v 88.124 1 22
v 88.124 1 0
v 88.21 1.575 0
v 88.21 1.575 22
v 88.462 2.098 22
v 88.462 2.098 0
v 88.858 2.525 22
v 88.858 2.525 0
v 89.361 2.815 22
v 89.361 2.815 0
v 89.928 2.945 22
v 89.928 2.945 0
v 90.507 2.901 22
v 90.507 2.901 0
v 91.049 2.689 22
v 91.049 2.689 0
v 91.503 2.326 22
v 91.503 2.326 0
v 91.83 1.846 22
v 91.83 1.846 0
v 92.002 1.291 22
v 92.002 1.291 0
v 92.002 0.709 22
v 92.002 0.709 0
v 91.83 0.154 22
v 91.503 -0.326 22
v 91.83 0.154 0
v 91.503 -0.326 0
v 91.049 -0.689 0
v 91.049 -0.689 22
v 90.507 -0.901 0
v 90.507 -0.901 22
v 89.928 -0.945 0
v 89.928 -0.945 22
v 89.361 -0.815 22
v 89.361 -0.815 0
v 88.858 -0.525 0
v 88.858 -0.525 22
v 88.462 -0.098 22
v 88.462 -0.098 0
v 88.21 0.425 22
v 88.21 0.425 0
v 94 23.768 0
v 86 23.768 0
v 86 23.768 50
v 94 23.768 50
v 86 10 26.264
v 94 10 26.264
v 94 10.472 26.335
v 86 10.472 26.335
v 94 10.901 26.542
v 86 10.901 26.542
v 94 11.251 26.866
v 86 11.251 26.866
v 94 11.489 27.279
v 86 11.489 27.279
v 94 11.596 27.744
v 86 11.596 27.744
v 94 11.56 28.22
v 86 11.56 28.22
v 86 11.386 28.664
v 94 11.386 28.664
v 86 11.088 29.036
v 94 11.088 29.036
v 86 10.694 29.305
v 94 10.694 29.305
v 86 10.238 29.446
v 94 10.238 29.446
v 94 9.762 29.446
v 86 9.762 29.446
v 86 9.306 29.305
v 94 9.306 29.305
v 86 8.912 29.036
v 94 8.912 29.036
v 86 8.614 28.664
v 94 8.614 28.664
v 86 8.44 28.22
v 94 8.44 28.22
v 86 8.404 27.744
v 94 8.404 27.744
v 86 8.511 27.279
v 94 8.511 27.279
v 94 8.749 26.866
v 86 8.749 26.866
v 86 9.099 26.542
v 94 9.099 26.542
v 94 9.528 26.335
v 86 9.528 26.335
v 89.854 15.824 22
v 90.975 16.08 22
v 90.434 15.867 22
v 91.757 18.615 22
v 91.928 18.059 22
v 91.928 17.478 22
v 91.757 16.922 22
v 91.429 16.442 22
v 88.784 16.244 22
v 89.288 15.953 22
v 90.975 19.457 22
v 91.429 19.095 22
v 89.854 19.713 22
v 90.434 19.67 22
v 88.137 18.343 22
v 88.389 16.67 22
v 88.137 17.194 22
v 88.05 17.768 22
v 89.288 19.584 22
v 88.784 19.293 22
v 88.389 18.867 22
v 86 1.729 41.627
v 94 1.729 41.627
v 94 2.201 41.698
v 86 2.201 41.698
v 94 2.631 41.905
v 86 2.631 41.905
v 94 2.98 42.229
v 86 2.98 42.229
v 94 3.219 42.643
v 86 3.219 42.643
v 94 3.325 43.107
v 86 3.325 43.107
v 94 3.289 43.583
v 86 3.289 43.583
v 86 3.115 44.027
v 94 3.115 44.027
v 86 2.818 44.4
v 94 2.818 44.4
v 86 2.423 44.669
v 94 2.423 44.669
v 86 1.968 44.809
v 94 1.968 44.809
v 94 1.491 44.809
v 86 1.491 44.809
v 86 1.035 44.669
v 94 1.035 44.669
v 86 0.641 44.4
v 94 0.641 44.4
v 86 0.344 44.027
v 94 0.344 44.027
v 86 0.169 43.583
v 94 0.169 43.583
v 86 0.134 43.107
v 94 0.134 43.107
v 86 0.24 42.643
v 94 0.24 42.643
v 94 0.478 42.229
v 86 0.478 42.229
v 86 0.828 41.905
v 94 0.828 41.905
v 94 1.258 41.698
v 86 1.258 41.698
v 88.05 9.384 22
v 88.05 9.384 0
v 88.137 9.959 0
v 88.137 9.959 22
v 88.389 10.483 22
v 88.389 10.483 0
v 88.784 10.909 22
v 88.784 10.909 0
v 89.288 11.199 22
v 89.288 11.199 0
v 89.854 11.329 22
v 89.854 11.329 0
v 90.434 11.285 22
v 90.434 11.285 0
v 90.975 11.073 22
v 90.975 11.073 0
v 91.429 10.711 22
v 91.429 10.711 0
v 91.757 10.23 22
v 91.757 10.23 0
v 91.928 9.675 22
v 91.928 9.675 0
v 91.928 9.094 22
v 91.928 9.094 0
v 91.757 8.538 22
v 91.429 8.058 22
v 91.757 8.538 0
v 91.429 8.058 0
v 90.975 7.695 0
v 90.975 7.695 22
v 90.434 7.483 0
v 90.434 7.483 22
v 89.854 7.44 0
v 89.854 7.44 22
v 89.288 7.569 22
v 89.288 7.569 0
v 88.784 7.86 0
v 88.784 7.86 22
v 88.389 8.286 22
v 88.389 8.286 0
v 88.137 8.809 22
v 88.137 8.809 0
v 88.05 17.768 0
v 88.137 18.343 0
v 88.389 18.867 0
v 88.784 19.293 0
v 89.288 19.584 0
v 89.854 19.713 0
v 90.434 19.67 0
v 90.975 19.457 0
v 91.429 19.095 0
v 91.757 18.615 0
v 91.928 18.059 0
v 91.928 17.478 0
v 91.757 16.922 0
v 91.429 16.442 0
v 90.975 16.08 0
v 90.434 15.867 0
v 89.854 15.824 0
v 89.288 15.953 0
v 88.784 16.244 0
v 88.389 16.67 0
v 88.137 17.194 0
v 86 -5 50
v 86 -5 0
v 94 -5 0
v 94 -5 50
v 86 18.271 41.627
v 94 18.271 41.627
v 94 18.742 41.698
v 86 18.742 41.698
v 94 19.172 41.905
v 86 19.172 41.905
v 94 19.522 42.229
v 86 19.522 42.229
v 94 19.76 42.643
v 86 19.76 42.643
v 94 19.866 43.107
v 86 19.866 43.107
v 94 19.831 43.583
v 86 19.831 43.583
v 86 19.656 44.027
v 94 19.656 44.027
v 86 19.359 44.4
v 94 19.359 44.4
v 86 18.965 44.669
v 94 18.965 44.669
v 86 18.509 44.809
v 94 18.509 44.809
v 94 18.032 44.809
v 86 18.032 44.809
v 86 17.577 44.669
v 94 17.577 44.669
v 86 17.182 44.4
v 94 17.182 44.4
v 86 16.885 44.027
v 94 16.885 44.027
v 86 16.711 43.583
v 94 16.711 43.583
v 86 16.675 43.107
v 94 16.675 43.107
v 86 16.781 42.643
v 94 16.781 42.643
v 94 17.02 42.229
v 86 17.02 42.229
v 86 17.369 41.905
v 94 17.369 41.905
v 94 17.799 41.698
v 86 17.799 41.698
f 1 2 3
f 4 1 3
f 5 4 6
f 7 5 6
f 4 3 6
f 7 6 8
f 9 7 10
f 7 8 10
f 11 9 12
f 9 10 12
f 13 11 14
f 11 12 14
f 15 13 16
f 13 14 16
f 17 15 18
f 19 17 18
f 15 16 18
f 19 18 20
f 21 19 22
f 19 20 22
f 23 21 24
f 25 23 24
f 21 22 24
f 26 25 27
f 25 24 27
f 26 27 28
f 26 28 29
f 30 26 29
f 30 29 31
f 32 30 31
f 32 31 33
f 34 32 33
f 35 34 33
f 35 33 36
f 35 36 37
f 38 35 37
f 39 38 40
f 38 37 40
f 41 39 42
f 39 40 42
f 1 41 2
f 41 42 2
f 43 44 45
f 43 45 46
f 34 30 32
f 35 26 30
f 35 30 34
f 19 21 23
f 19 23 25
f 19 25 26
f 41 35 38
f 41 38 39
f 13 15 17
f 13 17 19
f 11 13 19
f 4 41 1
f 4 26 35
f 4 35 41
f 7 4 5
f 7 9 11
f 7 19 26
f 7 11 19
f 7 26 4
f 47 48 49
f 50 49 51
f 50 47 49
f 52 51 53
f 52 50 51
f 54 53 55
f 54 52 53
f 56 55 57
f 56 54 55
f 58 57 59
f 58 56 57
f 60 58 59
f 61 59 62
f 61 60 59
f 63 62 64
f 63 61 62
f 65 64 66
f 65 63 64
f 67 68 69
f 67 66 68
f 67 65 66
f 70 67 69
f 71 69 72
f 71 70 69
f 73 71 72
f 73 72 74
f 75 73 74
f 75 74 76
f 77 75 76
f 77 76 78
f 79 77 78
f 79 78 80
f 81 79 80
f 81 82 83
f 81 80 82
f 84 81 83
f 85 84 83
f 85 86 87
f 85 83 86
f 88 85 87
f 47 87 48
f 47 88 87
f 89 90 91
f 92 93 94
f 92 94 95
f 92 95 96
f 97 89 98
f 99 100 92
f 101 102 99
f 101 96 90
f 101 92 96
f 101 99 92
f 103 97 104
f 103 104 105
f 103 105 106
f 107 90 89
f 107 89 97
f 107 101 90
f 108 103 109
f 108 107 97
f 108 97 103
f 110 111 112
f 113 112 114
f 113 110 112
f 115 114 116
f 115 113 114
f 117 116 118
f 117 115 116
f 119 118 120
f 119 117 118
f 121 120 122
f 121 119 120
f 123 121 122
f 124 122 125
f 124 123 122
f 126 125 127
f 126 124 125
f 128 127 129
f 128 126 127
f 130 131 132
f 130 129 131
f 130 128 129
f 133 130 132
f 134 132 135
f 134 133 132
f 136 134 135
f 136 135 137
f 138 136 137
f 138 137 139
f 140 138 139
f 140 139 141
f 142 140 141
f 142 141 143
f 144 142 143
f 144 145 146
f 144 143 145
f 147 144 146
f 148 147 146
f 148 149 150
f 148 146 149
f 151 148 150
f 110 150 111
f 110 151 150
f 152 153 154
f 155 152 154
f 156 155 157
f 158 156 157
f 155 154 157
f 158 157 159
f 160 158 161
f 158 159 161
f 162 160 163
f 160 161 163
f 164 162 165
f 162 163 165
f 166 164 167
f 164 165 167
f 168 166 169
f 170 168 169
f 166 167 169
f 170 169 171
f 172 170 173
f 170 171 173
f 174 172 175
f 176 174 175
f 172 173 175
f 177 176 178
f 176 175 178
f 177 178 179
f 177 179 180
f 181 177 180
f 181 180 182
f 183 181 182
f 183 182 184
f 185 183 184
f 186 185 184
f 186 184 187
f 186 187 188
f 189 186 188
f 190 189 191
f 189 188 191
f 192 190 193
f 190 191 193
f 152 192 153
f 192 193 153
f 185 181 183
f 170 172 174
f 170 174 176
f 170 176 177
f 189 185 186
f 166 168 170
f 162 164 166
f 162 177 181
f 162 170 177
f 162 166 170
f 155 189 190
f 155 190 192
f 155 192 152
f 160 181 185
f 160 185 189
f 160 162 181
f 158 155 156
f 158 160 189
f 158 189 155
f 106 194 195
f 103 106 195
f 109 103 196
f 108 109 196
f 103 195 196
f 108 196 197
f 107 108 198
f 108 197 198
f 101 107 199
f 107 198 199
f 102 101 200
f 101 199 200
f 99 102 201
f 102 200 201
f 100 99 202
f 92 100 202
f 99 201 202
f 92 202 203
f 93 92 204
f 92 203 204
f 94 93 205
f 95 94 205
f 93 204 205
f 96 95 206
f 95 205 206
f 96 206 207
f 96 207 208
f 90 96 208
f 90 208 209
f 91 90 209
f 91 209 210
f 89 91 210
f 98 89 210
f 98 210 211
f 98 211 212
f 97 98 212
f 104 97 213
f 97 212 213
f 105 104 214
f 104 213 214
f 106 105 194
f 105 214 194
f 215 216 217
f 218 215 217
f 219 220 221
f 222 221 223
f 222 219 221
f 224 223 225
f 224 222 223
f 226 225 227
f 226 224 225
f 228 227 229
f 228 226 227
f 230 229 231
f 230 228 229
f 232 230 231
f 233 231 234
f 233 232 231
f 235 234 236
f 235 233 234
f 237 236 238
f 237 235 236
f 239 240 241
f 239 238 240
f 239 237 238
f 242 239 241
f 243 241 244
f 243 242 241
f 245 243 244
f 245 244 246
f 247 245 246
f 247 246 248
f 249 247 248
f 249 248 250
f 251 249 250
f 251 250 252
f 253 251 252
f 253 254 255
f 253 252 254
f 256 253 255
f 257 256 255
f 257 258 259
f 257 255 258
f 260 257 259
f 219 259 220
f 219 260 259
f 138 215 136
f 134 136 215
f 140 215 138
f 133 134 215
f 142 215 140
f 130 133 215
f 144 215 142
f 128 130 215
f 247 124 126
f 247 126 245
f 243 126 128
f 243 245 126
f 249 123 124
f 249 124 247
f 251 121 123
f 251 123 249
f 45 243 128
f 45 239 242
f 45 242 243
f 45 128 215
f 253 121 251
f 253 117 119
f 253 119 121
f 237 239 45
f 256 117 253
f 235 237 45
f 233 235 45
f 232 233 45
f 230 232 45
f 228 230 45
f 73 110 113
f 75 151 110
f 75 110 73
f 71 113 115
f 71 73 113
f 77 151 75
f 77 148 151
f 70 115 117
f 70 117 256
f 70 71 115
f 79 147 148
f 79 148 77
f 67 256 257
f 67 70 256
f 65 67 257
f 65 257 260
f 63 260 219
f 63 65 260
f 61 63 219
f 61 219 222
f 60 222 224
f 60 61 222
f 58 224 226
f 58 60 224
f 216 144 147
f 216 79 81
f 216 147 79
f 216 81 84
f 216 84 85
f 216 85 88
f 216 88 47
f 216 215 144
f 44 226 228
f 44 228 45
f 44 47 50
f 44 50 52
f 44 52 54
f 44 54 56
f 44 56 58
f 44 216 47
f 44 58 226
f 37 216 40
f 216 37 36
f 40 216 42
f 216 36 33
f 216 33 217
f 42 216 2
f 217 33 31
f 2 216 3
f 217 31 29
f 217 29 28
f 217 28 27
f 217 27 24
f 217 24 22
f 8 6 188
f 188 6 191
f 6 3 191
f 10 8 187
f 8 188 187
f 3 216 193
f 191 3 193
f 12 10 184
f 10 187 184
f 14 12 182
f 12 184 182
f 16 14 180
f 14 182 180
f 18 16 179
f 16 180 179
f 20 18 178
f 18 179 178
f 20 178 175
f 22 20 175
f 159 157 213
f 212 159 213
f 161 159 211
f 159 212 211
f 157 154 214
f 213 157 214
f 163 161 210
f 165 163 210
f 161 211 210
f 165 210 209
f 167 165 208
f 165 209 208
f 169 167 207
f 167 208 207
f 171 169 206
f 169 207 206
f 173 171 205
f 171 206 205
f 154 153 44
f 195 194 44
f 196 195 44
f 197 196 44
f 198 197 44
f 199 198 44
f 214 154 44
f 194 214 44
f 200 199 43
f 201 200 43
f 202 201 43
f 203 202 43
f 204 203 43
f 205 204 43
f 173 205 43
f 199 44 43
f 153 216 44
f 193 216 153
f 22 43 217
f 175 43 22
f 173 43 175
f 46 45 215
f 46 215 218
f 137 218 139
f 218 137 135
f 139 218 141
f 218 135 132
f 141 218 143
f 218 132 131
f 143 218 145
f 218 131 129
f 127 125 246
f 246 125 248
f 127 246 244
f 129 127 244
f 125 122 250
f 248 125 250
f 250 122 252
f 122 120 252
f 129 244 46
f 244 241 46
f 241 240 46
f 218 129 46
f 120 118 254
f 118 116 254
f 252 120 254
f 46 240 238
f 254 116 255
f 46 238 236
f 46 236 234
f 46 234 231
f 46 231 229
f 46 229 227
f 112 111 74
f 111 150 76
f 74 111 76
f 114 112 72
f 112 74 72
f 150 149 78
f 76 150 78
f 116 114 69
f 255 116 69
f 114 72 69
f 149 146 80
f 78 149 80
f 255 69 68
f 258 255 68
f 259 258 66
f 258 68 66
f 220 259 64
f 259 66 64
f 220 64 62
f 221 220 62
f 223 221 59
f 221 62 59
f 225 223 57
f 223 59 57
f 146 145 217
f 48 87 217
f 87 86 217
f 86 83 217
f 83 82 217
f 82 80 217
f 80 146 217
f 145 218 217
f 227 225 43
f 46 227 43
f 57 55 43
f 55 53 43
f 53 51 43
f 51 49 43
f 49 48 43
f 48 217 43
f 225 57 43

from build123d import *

# Parameters (mm, degrees)
CROQUIS1_W              = 8
CROQUIS1_H              = 28.768453788
SALIENTE_EXTRUIR1_DEPTH = 50
CORTAR_EXTRUIR1_REACH   = 10
CROQUIS3_R              = 1.6
CROQUIS4_R              = 1.95
CORTAR_EXTRUIR2_DEPTH   = 22


with BuildPart() as part:
    # Croquis1 → Saliente-Extruir1 (new body)
    with BuildSketch(Plane.XY):
        with Locations((90, 9.384226894)):
            Rectangle(CROQUIS1_W, CROQUIS1_H)
    extrude(amount=SALIENTE_EXTRUIR1_DEPTH)

    # Croquis3 → Cortar-Extruir1 (cut, up to next)
    with BuildSketch(Plane(origin=(86, 0, 0), x_dir=(0, 0, -1), z_dir=(1, 0, 0)), mode=Mode.PRIVATE) as cortar_extruir1_sk1:
        with Locations((-43.227046774, 1.729227937)):
            Circle(CROQUIS3_R)
    cortar_extruir1_tool1 = extrude(cortar_extruir1_sk1.sketch, amount=CORTAR_EXTRUIR1_REACH, mode=Mode.PRIVATE) & part.part
    add(cortar_extruir1_tool1.solids().sort_by_distance((86, 1.729228, 43.227047))[0], mode=Mode.SUBTRACT)
    # Croquis3 → Cortar-Extruir1 (cut, up to next)
    with BuildSketch(Plane(origin=(86, 0, 0), x_dir=(0, 0, -1), z_dir=(1, 0, 0)), mode=Mode.PRIVATE) as cortar_extruir1_sk2:
        with Locations((-27.863523387, 10)):
            Circle(CROQUIS3_R)
    cortar_extruir1_tool2 = extrude(cortar_extruir1_sk2.sketch, amount=CORTAR_EXTRUIR1_REACH, mode=Mode.PRIVATE) & part.part
    add(cortar_extruir1_tool2.solids().sort_by_distance((86, 10, 27.863523))[0], mode=Mode.SUBTRACT)
    # Croquis3 → Cortar-Extruir1 (cut, up to next)
    with BuildSketch(Plane(origin=(86, 0, 0), x_dir=(0, 0, -1), z_dir=(1, 0, 0)), mode=Mode.PRIVATE) as cortar_extruir1_sk3:
        with Locations((-43.227046774, 18.270772063)):
            Circle(CROQUIS3_R)
    cortar_extruir1_tool3 = extrude(cortar_extruir1_sk3.sketch, amount=CORTAR_EXTRUIR1_REACH, mode=Mode.PRIVATE) & part.part
    add(cortar_extruir1_tool3.solids().sort_by_distance((86, 18.270772, 43.227047))[0], mode=Mode.SUBTRACT)

    # Croquis4 → Cortar-Extruir2 (cut)
    with BuildSketch(Plane(origin=(0, 0, 0), x_dir=(-1, 0, 0), z_dir=(0, 0, -1))):
        with Locations((-90.073577236, 1)):
            Circle(CROQUIS4_R)
        with Locations((-90, 9.384226894)):
            Circle(CROQUIS4_R)
        with Locations((-90, 17.768453788)):
            Circle(CROQUIS4_R)
    extrude(amount=-CORTAR_EXTRUIR2_DEPTH, mode=Mode.SUBTRACT)


solid = part.part
